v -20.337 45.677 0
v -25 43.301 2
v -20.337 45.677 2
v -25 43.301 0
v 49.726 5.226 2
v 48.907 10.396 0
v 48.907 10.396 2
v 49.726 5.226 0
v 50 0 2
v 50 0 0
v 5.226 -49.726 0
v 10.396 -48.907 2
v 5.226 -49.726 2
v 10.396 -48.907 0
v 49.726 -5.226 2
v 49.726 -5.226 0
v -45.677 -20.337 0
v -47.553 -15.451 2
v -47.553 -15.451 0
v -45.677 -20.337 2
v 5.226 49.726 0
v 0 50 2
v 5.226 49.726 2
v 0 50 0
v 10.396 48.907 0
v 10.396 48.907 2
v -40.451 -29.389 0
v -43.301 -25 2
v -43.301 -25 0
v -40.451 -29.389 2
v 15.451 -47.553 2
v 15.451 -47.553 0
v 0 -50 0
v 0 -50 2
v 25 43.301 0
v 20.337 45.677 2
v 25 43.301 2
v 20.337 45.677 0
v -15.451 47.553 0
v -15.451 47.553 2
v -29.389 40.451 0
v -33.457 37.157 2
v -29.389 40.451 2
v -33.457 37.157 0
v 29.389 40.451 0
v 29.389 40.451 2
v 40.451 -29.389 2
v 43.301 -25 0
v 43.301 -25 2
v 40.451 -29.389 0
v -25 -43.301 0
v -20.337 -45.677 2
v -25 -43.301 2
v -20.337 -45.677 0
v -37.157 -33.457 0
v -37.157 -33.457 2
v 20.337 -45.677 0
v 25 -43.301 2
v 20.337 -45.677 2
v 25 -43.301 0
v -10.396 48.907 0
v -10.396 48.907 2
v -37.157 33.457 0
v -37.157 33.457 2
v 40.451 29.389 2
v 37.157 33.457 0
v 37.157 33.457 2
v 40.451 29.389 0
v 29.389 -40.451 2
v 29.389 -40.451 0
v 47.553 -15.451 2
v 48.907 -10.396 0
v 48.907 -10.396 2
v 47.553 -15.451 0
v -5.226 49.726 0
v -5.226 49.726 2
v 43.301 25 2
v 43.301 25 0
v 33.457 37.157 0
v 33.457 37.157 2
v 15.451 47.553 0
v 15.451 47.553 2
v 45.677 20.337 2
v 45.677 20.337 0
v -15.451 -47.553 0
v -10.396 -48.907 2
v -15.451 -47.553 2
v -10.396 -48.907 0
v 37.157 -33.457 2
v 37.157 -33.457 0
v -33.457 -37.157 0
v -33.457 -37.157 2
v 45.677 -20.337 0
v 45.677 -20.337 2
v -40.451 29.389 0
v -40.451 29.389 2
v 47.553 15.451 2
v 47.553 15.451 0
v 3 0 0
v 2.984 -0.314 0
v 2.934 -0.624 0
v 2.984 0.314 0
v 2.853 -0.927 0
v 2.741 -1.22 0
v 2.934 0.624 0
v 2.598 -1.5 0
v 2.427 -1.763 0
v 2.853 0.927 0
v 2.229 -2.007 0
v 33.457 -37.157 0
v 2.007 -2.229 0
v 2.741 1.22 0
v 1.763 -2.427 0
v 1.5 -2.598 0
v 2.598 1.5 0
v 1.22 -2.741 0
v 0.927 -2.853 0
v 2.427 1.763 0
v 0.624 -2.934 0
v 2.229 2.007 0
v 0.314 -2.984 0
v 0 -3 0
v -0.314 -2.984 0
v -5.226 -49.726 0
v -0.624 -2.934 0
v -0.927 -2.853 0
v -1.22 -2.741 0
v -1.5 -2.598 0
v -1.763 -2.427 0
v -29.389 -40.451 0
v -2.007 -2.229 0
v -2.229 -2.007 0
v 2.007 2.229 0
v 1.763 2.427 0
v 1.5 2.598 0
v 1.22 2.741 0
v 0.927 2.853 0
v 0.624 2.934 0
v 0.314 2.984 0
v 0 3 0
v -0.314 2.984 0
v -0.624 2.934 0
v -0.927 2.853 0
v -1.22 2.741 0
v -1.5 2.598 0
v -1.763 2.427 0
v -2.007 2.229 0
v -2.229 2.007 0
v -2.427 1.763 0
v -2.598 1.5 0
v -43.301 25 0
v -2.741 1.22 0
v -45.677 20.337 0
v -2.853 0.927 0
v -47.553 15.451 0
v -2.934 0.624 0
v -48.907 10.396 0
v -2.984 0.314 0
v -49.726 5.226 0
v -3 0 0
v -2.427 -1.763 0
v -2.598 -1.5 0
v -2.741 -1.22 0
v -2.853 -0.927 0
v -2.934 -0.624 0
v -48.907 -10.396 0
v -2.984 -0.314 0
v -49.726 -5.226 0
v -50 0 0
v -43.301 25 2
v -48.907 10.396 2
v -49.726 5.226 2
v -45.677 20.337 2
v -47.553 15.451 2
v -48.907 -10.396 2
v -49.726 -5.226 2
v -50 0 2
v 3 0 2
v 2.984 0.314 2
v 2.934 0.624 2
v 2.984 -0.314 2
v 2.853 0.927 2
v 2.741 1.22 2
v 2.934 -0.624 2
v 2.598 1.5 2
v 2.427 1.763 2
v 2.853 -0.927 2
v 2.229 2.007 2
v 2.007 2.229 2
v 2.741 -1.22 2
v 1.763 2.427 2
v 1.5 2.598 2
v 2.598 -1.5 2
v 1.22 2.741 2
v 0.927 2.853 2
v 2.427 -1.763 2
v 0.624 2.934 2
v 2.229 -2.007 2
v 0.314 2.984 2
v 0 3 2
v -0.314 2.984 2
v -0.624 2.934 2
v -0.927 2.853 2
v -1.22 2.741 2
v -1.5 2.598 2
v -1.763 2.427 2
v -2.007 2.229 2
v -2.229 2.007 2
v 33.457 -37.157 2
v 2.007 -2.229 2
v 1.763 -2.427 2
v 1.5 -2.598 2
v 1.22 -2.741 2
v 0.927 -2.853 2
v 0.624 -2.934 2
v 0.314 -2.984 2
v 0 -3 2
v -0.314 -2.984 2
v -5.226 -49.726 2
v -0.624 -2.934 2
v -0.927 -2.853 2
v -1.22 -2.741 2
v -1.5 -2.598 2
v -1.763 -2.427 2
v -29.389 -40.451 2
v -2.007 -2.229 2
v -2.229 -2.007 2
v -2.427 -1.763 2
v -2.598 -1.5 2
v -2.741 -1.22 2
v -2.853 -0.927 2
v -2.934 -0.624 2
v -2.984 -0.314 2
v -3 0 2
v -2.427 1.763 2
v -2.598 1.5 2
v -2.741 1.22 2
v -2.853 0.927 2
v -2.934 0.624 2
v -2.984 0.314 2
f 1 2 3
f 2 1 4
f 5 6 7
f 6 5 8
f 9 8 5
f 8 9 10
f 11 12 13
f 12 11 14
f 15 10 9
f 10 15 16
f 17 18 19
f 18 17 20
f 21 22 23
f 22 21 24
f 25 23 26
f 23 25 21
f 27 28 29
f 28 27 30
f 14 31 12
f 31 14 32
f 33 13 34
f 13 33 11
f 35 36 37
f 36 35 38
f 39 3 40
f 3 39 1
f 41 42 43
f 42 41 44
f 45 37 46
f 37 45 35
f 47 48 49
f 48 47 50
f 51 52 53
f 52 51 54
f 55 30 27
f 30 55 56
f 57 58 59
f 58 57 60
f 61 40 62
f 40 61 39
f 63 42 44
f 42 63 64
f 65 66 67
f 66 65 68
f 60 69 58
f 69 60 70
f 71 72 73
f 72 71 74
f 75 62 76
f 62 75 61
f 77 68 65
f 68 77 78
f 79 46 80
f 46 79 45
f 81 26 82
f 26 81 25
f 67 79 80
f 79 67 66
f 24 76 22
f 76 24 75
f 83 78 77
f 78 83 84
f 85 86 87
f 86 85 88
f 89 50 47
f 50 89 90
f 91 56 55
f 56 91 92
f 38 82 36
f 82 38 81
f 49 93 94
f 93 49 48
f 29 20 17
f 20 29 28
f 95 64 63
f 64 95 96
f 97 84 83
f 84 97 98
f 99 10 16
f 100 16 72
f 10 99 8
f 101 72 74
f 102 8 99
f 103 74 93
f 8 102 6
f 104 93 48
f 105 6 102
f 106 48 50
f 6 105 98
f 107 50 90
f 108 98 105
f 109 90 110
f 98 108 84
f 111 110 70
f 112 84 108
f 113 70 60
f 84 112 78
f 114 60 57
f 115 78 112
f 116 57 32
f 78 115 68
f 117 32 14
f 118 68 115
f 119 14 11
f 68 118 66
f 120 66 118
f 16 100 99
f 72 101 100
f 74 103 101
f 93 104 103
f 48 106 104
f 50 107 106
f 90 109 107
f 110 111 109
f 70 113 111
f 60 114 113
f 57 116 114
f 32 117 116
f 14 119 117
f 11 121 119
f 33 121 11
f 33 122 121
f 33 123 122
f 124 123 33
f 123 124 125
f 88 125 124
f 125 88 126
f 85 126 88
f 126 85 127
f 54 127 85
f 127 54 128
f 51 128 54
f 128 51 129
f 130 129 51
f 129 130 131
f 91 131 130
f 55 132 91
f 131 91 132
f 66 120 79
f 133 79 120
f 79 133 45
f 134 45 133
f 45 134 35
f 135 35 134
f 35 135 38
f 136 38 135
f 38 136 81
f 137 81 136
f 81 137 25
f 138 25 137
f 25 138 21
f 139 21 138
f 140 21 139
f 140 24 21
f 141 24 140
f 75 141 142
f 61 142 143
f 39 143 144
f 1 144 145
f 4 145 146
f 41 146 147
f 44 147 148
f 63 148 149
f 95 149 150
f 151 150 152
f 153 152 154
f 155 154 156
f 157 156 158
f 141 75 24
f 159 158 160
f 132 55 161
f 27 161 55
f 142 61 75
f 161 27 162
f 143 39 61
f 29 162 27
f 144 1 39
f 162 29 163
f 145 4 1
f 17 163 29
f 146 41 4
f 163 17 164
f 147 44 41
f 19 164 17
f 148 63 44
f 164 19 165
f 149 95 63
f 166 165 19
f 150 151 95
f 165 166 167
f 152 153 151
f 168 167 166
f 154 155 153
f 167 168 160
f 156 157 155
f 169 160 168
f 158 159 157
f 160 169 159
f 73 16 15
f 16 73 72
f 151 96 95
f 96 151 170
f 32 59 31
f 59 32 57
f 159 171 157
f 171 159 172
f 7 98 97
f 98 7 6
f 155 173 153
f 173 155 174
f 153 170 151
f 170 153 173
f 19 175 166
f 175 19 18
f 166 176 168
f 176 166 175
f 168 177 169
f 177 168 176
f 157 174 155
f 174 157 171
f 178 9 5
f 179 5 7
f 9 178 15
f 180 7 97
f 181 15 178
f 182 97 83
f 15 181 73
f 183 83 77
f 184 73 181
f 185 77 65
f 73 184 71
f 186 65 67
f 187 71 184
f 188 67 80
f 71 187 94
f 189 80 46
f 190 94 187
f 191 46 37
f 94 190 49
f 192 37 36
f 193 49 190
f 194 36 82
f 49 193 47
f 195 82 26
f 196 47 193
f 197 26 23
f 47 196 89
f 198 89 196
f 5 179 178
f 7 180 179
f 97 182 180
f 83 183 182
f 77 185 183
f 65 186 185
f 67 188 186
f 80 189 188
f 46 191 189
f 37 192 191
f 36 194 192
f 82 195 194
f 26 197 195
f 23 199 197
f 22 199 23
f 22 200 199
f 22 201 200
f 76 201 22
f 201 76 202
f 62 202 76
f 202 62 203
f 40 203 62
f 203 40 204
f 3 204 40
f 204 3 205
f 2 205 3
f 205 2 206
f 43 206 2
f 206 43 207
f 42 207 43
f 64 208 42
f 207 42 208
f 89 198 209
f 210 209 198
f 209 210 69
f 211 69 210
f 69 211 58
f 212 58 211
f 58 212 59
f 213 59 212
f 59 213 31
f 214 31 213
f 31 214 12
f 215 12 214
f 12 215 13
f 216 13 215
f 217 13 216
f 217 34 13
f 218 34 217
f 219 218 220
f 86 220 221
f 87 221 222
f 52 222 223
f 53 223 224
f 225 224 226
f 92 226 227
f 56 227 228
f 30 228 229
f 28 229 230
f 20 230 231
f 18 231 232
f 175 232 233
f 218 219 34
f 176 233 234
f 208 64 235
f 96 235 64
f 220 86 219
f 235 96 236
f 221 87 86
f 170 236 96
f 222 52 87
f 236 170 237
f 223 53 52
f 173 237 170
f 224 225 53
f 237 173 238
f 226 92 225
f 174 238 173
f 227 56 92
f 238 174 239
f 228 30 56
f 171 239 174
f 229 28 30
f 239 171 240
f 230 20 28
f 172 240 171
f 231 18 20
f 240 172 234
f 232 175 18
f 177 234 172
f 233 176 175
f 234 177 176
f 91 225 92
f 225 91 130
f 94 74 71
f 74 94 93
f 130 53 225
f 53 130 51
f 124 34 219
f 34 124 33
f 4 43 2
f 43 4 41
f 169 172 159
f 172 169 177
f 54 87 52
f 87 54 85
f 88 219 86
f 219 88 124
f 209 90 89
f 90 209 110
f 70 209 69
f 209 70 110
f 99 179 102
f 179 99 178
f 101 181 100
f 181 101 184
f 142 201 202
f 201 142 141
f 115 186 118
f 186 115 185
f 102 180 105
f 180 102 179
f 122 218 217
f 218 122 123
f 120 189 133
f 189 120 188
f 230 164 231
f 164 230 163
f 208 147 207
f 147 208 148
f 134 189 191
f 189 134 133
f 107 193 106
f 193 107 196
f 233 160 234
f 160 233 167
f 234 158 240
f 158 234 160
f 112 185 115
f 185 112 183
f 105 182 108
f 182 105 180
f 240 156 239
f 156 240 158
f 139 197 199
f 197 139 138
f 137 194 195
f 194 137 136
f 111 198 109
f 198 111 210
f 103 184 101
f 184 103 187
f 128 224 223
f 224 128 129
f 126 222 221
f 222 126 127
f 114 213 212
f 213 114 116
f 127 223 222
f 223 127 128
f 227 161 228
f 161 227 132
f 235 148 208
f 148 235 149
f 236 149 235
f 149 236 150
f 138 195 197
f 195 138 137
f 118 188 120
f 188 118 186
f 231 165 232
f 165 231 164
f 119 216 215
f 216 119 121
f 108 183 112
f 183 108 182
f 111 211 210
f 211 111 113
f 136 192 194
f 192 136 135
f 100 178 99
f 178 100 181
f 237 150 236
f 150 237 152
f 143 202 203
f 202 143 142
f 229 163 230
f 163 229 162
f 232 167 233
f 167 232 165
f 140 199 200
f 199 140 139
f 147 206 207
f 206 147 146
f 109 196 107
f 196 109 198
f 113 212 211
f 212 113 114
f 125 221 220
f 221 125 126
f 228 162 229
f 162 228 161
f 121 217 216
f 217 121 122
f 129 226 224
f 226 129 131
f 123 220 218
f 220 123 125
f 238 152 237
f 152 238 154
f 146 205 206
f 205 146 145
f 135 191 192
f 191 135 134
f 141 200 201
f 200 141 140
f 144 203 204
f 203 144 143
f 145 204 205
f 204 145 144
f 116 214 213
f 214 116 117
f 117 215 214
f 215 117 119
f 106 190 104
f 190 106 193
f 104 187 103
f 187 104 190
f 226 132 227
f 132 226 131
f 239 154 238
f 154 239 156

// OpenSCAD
// diameter
inner = 6;

// diameter
outer = 100;


thickness = 2;

module washer (inner, outer, thickness) {

    difference() {
        cylinder(d=outer, h=thickness, $fn=60);
        translate([0,0,-thickness])
        cylinder(d=inner, h=thickness*3, $fn=60);
    };
}

// dimensions in mm
washer (inner, outer, thickness);
